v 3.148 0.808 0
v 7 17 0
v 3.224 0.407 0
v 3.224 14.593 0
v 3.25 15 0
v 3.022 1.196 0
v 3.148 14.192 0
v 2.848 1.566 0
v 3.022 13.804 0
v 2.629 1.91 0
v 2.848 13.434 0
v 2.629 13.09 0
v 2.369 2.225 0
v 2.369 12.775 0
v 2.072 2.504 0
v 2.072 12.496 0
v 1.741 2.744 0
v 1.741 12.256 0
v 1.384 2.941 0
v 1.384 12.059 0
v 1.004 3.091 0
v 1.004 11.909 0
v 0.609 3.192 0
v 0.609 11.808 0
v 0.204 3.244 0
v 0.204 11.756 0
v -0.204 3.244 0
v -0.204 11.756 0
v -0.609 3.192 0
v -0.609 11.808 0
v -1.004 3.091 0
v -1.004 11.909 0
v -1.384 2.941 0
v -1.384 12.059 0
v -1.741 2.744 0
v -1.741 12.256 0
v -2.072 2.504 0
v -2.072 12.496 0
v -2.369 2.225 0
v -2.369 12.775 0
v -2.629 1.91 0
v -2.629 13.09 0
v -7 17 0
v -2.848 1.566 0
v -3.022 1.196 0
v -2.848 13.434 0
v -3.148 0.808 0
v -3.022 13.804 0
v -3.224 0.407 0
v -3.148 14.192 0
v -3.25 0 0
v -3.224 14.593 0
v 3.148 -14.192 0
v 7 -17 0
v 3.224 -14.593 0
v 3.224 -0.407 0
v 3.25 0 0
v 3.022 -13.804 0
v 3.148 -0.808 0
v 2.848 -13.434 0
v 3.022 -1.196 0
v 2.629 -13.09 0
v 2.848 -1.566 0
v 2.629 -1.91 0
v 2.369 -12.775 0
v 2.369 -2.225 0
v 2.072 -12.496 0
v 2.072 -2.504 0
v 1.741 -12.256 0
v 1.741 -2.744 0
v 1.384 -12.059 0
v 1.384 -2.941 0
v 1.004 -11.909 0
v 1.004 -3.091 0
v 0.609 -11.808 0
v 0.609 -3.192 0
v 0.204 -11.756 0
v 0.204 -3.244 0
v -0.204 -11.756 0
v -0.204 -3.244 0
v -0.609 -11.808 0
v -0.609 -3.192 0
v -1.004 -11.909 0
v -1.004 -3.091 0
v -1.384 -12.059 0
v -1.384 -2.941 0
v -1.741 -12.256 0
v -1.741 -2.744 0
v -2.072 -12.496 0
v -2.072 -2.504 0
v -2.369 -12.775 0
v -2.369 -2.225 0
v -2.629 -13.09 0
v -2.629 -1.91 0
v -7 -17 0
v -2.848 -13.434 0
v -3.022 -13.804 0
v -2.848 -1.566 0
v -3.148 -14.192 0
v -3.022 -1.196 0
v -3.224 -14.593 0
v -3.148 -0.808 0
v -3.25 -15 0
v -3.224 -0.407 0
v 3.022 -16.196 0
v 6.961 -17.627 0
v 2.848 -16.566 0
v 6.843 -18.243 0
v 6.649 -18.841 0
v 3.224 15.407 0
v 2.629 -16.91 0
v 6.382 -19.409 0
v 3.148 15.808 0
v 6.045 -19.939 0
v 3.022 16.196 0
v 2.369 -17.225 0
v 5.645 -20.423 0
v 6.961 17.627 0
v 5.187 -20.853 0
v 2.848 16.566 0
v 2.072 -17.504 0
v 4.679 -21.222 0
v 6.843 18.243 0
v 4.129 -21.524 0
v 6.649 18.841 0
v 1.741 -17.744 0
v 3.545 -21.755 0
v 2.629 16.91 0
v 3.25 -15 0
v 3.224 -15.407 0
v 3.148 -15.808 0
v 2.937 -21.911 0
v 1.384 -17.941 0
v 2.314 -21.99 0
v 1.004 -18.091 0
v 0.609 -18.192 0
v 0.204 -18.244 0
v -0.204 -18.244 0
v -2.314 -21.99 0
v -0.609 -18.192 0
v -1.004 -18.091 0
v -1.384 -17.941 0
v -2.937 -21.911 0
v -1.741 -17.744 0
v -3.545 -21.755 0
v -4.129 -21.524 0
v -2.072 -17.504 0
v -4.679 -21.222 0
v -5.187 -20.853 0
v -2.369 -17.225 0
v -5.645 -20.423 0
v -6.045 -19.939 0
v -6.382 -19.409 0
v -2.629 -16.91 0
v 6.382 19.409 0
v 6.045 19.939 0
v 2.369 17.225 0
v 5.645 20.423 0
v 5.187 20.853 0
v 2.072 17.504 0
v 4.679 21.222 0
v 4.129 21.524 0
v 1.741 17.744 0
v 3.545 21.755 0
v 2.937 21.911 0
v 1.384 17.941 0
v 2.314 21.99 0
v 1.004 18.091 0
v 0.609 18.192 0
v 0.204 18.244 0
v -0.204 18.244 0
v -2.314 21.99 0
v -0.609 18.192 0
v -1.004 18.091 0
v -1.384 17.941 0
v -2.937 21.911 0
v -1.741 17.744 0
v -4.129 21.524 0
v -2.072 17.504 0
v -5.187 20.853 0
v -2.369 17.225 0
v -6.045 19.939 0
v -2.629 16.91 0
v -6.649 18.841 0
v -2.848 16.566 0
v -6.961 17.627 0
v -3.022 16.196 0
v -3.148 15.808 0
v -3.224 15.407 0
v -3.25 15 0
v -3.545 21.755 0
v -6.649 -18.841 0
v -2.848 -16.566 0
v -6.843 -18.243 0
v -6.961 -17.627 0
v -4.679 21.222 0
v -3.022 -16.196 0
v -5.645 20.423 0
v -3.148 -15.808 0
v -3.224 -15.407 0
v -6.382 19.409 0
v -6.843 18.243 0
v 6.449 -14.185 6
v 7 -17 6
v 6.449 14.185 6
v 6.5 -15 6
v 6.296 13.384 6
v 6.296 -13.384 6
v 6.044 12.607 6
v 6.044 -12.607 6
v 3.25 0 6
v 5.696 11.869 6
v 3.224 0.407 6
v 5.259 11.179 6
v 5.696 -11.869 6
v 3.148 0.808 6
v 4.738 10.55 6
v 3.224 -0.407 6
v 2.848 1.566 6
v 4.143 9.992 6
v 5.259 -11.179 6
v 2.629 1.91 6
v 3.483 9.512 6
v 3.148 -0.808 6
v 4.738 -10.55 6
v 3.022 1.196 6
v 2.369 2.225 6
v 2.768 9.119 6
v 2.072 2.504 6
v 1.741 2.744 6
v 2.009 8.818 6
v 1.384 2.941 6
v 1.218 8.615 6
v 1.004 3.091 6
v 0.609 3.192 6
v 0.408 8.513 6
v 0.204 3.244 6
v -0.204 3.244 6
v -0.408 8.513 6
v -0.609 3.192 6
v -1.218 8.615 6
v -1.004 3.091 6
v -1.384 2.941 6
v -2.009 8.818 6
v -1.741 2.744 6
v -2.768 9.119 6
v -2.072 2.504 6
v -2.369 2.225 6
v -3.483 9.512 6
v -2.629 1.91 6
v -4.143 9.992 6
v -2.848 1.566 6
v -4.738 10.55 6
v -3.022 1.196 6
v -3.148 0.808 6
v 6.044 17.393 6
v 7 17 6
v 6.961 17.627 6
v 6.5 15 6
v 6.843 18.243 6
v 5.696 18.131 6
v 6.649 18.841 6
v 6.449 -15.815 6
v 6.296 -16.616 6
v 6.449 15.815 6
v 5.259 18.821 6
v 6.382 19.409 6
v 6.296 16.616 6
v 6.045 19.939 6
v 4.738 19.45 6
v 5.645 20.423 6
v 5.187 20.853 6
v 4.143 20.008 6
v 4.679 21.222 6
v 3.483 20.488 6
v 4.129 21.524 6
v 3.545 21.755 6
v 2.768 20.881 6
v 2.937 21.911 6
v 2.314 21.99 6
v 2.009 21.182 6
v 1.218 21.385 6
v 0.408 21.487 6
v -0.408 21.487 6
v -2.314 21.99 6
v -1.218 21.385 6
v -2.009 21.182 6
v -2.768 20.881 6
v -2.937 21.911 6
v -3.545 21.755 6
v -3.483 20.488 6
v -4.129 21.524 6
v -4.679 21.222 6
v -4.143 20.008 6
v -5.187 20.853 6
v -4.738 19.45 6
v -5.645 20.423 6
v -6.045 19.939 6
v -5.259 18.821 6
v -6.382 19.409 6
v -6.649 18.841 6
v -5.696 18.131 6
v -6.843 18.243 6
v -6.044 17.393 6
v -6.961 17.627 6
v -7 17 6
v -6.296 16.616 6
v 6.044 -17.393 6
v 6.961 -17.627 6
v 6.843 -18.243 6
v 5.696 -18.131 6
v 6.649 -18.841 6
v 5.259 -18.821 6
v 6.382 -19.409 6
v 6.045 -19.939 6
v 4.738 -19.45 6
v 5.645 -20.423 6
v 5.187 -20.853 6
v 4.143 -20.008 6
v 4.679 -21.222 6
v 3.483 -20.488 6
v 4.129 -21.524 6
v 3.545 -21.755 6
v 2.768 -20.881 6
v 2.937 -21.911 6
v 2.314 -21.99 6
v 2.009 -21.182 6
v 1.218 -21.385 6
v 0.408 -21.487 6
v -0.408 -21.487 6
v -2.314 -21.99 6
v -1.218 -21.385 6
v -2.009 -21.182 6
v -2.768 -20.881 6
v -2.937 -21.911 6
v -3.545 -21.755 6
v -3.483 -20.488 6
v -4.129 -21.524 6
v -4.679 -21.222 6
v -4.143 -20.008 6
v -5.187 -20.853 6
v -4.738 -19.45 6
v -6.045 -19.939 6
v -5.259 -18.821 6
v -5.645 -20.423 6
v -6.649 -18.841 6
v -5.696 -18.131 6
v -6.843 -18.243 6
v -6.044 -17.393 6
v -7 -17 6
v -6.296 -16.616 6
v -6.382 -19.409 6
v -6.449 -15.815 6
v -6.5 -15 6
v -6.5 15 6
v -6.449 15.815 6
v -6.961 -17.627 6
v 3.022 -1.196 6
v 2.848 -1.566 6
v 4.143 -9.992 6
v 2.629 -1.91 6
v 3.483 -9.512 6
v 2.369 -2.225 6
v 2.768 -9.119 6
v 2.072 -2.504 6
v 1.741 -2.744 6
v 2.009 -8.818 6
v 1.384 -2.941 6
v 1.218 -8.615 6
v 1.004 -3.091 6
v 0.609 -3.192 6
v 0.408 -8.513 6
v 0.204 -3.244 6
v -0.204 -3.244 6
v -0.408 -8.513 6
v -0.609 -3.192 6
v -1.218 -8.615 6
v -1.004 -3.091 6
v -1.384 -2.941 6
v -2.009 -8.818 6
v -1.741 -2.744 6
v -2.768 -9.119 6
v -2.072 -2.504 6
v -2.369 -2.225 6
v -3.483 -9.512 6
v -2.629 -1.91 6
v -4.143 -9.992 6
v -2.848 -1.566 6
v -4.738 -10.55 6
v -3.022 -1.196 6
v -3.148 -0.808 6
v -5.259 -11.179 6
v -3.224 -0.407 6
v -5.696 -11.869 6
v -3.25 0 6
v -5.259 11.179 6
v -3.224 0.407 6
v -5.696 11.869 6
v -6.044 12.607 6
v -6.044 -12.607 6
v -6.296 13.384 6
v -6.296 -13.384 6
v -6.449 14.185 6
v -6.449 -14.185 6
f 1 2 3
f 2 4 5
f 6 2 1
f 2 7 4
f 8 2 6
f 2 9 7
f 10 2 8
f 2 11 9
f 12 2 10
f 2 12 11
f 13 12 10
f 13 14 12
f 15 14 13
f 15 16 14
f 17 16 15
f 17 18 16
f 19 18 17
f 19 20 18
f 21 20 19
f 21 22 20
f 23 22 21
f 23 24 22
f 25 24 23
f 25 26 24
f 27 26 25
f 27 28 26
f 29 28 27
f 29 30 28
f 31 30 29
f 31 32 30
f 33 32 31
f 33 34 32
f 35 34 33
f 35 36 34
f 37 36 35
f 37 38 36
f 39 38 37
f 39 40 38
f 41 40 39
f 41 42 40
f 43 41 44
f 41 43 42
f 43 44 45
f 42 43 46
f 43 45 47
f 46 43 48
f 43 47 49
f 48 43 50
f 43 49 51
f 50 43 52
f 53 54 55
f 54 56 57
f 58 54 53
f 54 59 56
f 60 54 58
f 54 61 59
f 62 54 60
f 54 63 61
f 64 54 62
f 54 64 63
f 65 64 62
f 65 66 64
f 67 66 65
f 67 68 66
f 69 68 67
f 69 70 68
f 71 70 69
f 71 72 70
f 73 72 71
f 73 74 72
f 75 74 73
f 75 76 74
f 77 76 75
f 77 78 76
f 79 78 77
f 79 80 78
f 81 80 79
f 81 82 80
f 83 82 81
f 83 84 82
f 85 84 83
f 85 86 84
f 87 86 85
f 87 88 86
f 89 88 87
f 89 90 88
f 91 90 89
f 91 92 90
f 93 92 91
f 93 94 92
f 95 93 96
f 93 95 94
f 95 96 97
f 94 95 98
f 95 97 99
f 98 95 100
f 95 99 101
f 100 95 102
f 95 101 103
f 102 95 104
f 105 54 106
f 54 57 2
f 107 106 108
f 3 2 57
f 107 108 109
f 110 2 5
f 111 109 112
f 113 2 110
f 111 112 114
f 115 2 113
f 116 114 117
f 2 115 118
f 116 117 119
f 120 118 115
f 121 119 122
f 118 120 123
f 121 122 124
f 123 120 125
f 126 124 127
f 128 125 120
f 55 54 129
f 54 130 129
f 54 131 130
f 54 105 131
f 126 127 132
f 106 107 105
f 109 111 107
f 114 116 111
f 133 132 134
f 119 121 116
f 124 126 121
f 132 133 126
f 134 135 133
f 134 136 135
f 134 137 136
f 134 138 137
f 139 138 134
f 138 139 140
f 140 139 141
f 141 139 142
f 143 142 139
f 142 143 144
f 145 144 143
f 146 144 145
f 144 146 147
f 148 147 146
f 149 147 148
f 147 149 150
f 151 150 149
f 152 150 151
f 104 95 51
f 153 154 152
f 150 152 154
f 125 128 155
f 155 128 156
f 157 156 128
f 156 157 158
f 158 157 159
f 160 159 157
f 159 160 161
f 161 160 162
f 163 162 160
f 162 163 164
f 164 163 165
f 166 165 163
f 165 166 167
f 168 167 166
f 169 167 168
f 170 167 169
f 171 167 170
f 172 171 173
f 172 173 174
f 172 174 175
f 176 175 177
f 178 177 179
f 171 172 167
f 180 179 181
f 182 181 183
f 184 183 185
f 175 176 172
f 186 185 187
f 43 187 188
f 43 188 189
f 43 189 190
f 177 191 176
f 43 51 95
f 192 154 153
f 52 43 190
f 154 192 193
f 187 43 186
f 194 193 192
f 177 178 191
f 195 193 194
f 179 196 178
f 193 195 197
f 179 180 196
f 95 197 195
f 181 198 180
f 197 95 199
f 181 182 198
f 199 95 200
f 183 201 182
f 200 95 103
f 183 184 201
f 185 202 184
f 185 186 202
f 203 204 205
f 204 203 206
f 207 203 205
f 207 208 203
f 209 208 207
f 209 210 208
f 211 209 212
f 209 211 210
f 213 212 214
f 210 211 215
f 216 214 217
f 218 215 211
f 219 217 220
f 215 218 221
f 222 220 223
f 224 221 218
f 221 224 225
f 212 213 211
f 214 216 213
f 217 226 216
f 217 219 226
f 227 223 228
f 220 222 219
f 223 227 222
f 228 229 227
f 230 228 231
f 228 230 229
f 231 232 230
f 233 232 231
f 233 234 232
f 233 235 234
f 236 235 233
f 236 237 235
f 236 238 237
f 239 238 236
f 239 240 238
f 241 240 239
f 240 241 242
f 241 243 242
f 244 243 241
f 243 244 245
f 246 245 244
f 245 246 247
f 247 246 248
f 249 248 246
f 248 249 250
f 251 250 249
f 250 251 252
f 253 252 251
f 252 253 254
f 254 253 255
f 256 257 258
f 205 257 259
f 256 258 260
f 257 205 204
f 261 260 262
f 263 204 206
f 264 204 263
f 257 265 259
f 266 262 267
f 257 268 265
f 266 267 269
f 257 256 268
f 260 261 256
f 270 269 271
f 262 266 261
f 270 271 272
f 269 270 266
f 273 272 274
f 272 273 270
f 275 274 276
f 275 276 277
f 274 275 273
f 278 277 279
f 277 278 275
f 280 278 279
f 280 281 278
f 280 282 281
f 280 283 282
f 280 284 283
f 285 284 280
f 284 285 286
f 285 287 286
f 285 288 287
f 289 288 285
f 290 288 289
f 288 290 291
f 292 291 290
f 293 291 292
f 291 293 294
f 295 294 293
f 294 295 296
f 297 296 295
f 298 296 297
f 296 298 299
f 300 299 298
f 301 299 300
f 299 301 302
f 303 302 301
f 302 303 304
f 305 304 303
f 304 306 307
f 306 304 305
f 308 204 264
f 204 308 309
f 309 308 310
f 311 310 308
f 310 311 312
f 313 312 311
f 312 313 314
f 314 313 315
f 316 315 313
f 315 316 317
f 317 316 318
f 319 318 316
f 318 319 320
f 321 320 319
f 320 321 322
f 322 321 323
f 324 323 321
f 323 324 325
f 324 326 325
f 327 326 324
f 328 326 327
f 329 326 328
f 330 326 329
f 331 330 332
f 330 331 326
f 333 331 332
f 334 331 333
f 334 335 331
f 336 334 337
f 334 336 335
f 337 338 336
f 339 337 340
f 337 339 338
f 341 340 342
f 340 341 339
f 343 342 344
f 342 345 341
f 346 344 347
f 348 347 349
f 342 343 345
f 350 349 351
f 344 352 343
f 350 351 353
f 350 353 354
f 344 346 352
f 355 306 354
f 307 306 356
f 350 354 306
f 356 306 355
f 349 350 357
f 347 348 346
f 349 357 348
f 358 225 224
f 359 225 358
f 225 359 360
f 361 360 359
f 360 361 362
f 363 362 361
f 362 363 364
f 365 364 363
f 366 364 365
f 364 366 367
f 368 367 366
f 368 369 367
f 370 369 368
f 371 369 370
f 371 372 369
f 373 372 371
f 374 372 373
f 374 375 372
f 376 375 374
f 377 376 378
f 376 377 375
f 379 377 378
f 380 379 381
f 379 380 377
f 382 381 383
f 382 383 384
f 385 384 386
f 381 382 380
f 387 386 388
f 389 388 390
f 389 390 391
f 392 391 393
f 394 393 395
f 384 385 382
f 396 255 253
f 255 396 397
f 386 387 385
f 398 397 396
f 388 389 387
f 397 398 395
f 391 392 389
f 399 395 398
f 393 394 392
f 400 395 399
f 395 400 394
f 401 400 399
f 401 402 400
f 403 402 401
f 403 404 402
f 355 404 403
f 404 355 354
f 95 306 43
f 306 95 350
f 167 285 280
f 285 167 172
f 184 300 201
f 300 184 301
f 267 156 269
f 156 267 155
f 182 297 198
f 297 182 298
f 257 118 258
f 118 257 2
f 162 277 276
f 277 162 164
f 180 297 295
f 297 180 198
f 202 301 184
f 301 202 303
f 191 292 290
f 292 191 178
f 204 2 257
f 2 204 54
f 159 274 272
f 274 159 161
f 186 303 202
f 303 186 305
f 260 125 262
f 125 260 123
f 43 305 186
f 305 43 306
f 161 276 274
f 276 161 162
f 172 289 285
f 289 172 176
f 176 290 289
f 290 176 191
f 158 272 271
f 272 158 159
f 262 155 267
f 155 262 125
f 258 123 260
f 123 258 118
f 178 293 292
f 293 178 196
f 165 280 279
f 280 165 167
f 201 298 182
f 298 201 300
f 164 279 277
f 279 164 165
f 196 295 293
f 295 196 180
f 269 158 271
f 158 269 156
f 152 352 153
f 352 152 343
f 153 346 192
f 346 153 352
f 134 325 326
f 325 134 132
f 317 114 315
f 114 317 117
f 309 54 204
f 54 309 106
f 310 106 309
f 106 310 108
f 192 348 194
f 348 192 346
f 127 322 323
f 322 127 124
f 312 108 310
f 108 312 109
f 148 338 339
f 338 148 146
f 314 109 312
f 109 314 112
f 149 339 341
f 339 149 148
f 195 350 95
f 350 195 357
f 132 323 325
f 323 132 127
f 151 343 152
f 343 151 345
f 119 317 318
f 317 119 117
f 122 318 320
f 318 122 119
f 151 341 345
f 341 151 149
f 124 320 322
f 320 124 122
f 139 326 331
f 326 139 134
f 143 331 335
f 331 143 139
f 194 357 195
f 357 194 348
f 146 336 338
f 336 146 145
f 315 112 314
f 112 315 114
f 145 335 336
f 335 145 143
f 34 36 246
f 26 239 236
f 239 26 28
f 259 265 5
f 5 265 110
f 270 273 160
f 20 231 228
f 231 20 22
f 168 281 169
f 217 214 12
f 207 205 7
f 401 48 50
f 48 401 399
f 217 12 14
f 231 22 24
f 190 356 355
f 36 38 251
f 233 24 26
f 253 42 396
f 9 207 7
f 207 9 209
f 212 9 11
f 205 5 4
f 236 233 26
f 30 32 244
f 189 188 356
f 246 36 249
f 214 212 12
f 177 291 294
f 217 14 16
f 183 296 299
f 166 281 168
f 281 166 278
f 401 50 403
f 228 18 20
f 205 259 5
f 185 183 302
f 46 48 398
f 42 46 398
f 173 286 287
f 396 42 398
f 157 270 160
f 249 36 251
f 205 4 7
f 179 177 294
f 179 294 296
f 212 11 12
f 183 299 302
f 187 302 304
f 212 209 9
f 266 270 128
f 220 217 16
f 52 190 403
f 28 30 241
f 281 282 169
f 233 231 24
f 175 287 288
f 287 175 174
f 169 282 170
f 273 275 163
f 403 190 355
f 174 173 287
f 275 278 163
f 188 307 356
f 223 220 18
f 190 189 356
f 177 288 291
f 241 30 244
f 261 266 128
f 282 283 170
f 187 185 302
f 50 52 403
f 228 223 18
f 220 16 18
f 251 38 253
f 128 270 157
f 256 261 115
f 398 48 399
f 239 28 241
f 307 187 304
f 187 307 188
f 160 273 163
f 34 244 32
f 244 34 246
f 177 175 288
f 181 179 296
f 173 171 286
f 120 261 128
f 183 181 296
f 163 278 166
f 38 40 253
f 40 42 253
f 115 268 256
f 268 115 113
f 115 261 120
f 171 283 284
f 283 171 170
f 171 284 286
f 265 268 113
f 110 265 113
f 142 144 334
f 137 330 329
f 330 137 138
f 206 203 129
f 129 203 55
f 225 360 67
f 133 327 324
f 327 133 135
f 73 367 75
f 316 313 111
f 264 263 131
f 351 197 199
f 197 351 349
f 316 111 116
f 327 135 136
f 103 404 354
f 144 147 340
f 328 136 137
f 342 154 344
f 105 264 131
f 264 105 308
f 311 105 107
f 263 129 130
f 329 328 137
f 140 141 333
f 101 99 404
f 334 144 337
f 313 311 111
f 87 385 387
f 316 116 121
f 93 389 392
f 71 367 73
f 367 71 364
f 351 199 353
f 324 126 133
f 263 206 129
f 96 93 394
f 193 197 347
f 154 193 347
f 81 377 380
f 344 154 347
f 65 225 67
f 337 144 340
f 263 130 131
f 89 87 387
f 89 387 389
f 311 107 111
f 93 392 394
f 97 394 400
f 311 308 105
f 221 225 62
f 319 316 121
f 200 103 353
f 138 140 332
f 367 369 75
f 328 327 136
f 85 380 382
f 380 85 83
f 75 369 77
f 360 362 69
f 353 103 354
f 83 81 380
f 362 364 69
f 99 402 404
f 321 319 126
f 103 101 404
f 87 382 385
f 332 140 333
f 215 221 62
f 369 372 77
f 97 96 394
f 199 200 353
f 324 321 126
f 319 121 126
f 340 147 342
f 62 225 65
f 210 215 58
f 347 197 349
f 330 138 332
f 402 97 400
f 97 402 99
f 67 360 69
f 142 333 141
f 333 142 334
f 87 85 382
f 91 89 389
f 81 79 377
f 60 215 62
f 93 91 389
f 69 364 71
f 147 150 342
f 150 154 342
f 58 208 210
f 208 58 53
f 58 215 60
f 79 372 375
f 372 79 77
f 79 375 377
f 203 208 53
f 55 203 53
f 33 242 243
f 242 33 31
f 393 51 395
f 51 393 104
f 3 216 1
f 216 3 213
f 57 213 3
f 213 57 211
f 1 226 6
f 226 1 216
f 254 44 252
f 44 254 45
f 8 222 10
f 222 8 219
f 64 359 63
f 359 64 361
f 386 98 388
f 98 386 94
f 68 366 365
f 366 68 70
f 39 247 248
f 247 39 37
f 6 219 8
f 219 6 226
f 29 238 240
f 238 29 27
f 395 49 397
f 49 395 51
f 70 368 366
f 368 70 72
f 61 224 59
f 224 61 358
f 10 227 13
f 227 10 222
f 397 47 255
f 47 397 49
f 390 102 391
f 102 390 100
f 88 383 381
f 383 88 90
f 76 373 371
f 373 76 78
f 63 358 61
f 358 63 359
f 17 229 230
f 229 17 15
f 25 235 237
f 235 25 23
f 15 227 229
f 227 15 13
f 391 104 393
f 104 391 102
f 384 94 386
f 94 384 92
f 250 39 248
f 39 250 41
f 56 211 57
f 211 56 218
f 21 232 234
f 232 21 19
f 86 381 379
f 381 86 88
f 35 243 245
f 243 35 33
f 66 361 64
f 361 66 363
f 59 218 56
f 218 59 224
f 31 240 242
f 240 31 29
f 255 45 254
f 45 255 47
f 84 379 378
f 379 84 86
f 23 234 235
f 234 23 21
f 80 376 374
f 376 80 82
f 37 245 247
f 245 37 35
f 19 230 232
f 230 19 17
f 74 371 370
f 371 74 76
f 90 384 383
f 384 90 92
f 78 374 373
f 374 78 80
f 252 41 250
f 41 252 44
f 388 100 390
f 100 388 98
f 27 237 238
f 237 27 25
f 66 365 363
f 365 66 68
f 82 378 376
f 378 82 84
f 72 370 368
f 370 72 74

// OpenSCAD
$fn = 50;


difference() {
	union() {
		cylinder(h = 6, r = 7.0000000000);
		translate(v = [0.0000000000, 7.5000000000, 0]) {
			hull() {
				translate(v = [-2.0000000000, 9.5000000000, 0]) {
					cylinder(h = 6, r = 5);
				}
				translate(v = [2.0000000000, 9.5000000000, 0]) {
					cylinder(h = 6, r = 5);
				}
				translate(v = [-2.0000000000, -9.5000000000, 0]) {
					cylinder(h = 6, r = 5);
				}
				translate(v = [2.0000000000, -9.5000000000, 0]) {
					cylinder(h = 6, r = 5);
				}
			}
		}
		translate(v = [0.0000000000, 7.5000000000, 0]) {
			hull() {
				translate(v = [-2.0000000000, 9.5000000000, 0]) {
					cylinder(h = 6, r = 5);
				}
				translate(v = [2.0000000000, 9.5000000000, 0]) {
					cylinder(h = 6, r = 5);
				}
				translate(v = [-2.0000000000, -9.5000000000, 0]) {
					cylinder(h = 6, r = 5);
				}
				translate(v = [2.0000000000, -9.5000000000, 0]) {
					cylinder(h = 6, r = 5);
				}
			}
		}
		translate(v = [0.0000000000, -7.5000000000, 0]) {
			hull() {
				translate(v = [-2.0000000000, 9.5000000000, 0]) {
					cylinder(h = 6, r = 5);
				}
				translate(v = [2.0000000000, 9.5000000000, 0]) {
					cylinder(h = 6, r = 5);
				}
				translate(v = [-2.0000000000, -9.5000000000, 0]) {
					cylinder(h = 6, r = 5);
				}
				translate(v = [2.0000000000, -9.5000000000, 0]) {
					cylinder(h = 6, r = 5);
				}
			}
		}
		translate(v = [0.0000000000, -7.5000000000, 0]) {
			hull() {
				translate(v = [-2.0000000000, 9.5000000000, 0]) {
					cylinder(h = 6, r = 5);
				}
				translate(v = [2.0000000000, 9.5000000000, 0]) {
					cylinder(h = 6, r = 5);
				}
				translate(v = [-2.0000000000, -9.5000000000, 0]) {
					cylinder(h = 6, r = 5);
				}
				translate(v = [2.0000000000, -9.5000000000, 0]) {
					cylinder(h = 6, r = 5);
				}
			}
		}
	}
	union() {
		translate(v = [0.0000000000, 15.0000000000, 6]) {
			rotate(a = [0, 0, 0]) {
				difference() {
					union() {
						#translate(v = [0, 0, -6.0000000000]) {
							cylinder(h = 6, r = 2.2500000000);
						}
						#translate(v = [0, 0, -6]) {
							cylinder(h = 6, r1 = 3.2500000000, r2 = 6.5000000000);
						}
						#translate(v = [0, 0, -6.0000000000]) {
							cylinder(h = 6, r = 3.2500000000);
						}
						#translate(v = [0, 0, -6.0000000000]) {
							cylinder(h = 6, r = 2.2500000000);
						}
					}
					union();
				}
			}
		}
		translate(v = [0.0000000000, 15.0000000000, 6]) {
			rotate(a = [0, 0, 0]) {
				difference() {
					union() {
						#translate(v = [0, 0, -6.0000000000]) {
							cylinder(h = 6, r = 2.2500000000);
						}
						#translate(v = [0, 0, -6]) {
							cylinder(h = 6, r1 = 3.2500000000, r2 = 6.5000000000);
						}
						#translate(v = [0, 0, -6.0000000000]) {
							cylinder(h = 6, r = 3.2500000000);
						}
						#translate(v = [0, 0, -6.0000000000]) {
							cylinder(h = 6, r = 2.2500000000);
						}
					}
					union();
				}
			}
		}
		translate(v = [0.0000000000, -15.0000000000, 6]) {
			rotate(a = [0, 0, 0]) {
				difference() {
					union() {
						#translate(v = [0, 0, -6.0000000000]) {
							cylinder(h = 6, r = 2.2500000000);
						}
						#translate(v = [0, 0, -6]) {
							cylinder(h = 6, r1 = 3.2500000000, r2 = 6.5000000000);
						}
						#translate(v = [0, 0, -6.0000000000]) {
							cylinder(h = 6, r = 3.2500000000);
						}
						#translate(v = [0, 0, -6.0000000000]) {
							cylinder(h = 6, r = 2.2500000000);
						}
					}
					union();
				}
			}
		}
		translate(v = [0.0000000000, -15.0000000000, 6]) {
			rotate(a = [0, 0, 0]) {
				difference() {
					union() {
						#translate(v = [0, 0, -6.0000000000]) {
							cylinder(h = 6, r = 2.2500000000);
						}
						#translate(v = [0, 0, -6]) {
							cylinder(h = 6, r1 = 3.2500000000, r2 = 6.5000000000);
						}
						#translate(v = [0, 0, -6.0000000000]) {
							cylinder(h = 6, r = 3.2500000000);
						}
						#translate(v = [0, 0, -6.0000000000]) {
							cylinder(h = 6, r = 2.2500000000);
						}
					}
					union();
				}
			}
		}
		translate(v = [0, 0, -100]) {
			cylinder(h = 200, r = 3.2500000000);
		}
		translate(v = [0, 0, -100]) {
			cylinder(h = 200, r = 1.8000000000);
		}
	}
}
